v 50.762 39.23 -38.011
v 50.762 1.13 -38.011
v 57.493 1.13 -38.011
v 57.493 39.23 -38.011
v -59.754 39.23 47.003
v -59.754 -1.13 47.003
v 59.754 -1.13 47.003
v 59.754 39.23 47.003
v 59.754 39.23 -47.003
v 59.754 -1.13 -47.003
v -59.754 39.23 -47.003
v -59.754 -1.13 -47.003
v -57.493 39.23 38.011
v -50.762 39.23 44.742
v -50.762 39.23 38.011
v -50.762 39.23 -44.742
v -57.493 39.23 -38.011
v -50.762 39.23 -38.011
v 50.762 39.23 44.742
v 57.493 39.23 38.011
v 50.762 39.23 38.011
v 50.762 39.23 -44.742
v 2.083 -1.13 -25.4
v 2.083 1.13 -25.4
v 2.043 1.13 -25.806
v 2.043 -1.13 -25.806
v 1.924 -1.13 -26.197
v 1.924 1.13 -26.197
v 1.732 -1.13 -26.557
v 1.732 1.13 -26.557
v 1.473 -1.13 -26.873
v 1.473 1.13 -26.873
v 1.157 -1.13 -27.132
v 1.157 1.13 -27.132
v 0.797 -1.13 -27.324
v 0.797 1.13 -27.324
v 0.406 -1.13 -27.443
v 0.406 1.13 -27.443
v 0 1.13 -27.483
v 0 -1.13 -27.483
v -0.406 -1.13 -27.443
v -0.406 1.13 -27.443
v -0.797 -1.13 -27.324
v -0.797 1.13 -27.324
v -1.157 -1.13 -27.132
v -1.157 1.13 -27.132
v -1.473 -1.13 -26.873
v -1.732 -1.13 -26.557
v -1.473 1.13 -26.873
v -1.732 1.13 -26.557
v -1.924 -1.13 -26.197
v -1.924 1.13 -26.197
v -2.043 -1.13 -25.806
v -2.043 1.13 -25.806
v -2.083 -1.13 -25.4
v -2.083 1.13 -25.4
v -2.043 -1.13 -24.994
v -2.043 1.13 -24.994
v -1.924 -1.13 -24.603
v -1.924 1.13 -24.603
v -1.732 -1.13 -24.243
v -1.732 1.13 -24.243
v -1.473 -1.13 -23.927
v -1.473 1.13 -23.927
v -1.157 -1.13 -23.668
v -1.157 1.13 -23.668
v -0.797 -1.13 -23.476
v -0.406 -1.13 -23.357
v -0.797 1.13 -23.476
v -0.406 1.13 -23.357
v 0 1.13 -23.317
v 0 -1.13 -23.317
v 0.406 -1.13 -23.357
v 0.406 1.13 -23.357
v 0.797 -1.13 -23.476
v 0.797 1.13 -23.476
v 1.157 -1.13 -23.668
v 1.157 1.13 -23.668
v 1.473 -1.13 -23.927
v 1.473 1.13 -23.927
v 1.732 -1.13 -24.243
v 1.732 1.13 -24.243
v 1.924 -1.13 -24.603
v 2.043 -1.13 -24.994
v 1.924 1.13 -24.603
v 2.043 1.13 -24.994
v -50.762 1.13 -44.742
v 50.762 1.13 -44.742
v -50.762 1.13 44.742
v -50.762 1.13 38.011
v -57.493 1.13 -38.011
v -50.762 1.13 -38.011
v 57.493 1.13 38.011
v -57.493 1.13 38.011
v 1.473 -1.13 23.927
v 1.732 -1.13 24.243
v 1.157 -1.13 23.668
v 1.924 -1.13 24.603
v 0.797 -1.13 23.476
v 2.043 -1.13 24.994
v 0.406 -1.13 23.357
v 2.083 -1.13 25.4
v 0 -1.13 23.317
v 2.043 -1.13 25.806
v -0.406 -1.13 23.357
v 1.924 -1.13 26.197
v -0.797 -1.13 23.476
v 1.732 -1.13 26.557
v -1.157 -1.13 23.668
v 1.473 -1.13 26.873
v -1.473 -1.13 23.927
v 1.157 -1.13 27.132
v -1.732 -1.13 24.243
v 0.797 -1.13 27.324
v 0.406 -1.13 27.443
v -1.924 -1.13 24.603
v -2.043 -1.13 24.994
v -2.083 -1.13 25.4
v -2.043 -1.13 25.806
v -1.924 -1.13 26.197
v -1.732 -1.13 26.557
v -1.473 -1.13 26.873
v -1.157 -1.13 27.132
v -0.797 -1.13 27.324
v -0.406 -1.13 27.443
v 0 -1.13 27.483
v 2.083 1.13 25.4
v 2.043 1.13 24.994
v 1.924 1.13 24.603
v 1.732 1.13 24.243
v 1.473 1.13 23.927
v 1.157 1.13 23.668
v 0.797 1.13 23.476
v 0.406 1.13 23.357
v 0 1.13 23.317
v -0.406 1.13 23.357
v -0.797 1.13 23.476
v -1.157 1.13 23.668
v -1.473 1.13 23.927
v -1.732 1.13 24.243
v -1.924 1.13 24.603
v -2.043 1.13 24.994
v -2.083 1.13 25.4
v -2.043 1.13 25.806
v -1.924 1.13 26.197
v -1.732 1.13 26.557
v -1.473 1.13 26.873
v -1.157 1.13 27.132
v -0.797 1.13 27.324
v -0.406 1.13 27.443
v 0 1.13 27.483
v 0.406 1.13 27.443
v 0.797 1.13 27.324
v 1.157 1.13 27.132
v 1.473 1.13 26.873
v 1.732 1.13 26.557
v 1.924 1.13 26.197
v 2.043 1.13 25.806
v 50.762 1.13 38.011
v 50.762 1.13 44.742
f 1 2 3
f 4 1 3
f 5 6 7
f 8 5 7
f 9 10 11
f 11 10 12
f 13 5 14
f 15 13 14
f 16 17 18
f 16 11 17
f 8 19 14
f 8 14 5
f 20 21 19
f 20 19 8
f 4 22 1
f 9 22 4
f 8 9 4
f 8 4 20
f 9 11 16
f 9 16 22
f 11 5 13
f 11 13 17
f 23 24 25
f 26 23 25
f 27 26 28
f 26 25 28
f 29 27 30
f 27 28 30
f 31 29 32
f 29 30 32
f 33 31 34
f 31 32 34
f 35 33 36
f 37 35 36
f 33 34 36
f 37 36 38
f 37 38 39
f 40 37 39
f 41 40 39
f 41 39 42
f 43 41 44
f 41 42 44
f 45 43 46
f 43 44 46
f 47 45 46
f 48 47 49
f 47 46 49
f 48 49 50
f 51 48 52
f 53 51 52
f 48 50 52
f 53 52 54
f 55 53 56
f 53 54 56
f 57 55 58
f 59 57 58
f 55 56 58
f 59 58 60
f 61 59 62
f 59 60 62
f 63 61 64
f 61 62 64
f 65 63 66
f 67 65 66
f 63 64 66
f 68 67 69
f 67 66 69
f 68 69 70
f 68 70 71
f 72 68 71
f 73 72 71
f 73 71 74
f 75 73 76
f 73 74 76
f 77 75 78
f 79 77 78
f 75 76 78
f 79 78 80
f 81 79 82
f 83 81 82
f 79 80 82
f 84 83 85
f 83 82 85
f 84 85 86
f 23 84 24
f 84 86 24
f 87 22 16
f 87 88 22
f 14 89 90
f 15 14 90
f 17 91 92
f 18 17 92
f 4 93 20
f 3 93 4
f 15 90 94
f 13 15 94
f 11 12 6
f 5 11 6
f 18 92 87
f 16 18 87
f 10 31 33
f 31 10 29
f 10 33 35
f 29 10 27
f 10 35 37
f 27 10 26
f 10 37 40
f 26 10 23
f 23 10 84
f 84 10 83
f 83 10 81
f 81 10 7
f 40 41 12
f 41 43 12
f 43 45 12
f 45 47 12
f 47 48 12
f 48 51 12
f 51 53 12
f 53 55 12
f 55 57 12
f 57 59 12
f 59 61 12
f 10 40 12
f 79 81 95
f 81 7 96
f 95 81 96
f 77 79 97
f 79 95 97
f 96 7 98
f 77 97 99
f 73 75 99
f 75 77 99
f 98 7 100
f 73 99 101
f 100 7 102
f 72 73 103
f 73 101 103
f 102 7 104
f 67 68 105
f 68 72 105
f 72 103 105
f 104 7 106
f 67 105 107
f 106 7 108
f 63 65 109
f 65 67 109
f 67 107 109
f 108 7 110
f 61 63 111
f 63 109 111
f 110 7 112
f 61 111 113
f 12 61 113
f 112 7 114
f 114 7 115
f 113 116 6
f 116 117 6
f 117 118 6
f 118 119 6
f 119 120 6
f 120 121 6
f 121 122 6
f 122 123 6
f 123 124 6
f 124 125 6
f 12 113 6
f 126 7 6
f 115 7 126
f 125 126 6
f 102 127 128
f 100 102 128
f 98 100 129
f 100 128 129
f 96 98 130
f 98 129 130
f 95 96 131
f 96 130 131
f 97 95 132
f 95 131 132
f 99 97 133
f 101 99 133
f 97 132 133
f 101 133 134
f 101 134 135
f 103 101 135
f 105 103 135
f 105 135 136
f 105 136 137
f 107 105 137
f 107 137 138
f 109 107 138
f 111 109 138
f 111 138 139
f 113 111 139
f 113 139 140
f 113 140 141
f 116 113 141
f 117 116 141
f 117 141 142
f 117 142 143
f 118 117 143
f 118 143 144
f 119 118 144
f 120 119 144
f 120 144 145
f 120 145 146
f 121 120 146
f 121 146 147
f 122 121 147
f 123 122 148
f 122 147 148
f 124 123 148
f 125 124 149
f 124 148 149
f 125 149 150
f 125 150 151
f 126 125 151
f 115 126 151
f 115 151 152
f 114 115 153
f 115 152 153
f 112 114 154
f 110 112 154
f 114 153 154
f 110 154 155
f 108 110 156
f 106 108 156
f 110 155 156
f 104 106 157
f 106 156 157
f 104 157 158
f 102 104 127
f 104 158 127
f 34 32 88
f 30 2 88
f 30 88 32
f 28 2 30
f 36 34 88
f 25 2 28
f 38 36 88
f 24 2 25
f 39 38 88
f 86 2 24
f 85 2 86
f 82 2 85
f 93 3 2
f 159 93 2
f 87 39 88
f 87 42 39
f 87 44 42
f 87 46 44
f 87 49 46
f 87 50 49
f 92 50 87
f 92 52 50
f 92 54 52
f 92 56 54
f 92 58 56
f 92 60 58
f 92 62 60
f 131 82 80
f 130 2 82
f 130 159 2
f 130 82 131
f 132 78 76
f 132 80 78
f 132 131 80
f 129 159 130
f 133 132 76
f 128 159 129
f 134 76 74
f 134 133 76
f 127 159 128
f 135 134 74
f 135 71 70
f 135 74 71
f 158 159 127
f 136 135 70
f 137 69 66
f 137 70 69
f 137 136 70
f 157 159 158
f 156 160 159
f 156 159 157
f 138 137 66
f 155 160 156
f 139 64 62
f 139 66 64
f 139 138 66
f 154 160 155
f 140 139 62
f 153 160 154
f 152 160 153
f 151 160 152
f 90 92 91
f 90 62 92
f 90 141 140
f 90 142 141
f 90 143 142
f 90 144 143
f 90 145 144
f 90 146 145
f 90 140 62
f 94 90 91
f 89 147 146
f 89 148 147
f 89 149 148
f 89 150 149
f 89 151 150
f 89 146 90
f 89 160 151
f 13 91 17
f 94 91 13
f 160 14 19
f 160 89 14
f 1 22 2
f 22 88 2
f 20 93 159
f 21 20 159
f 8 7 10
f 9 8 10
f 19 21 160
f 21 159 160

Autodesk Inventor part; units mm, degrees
ref_plane "YZ Plane" through (0, 0, 0) normal (1, 0, 0) x (0, 1, 0)
ref_plane "XZ Plane" through (0, 0, 0) normal (0, 1, 0) x (-1, 0, 0)
ref_plane "XY Plane" through (0, 0, 0) normal (0, 0, 1) x (1, 0, 0)
sketch "Sketch1" plane through (0, 0, 0) normal (0, 1, 0) x (-1, 0, 0)
  line L0 (-59.7535, -47.0027) -> (59.7535, -47.0027)
  line L1 (59.7535, -47.0027) -> (59.7535, 47.0027)
  line L2 (59.7535, 47.0027) -> (-59.7535, 47.0027)
  line L3 (-59.7535, 47.0027) -> (-59.7535, -47.0027)
  line L4 (-59.7535, -47.0027) -> (59.7535, 47.0027) construction
  line L5 (59.7535, -47.0027) -> (-59.7535, 47.0027) construction
  point P0 (0, 0)
  dimension "d0" = 119.507
  dimension "d1" = 94.0054
extrude "Extrusion1" add sketch "Sketch1" along normal mid plane 2.2606
sketch "Sketch2" plane through (0, 1.1303, 0) normal (0, 1, 0) x (1, 0, 0)
  line L0 (-59.7535, 47.0027) -> (-59.7535, -47.0027) projected
  line L1 (59.7535, -47.0027) -> (59.7535, 47.0027) projected
  line L2 (-59.7535, -47.0027) -> (59.7535, -47.0027)
  line L3 (59.7535, -47.0027) -> (59.7535, 47.0027)
  line L4 (59.7535, 47.0027) -> (-59.7535, 47.0027)
  line L5 (-59.7535, 47.0027) -> (-59.7535, -47.0027)
  line L6 (57.4929, -44.7421) -> (-57.4929, 44.7421) construction
  line L7 (-57.4929, -44.7421) -> (57.4929, 44.7421) construction
  line L8 (-59.7535, -47.0027) -> (59.7535, -47.0027) projected
  line L9 (-59.7535, -47.0027) -> (-50.7619, -47.0027)
  line L10 (-59.7535, -38.0111) -> (-59.7535, -47.0027)
  line L11 (-59.7535, 47.0027) -> (-50.7619, 47.0027)
  line L12 (-59.7535, 38.0111) -> (-59.7535, 47.0027)
  line L13 (59.7535, 47.0027) -> (-59.7535, 47.0027) projected
  line L14 (59.7535, 47.0027) -> (50.7619, 47.0027)
  line L15 (59.7535, 38.0111) -> (59.7535, 47.0027)
  line L16 (59.7535, -47.0027) -> (50.7619, -47.0027)
  line L17 (59.7535, -38.0111) -> (59.7535, -47.0027)
  line L18 (-50.7619, -44.7421) -> (-50.7619, -38.0111)
  line L19 (-50.7619, -38.0111) -> (-57.4929, -38.0111)
  line L20 (-57.4929, 38.0111) -> (-50.7619, 38.0111)
  line L21 (-50.7619, 38.0111) -> (-50.7619, 44.7421)
  line L22 (50.7619, 38.0111) -> (57.4929, 38.0111)
  line L23 (50.7619, 44.7421) -> (50.7619, 38.0111)
  line L24 (57.4929, -38.0111) -> (50.7619, -38.0111)
  line L25 (50.7619, -38.0111) -> (50.7619, -44.7421)
  line L26 (-50.7619, -44.7421) -> (50.7619, -44.7421)
  line L27 (57.4929, -38.0111) -> (57.4929, 38.0111)
  line L28 (50.7619, 44.7421) -> (-50.7619, 44.7421)
  line L29 (-57.4929, 38.0111) -> (-57.4929, -38.0111)
  point P0 (0, 0)
  dimension "d4" = 114.9858
  dimension "d5" = 89.4842
  dimension "d6" = 8.9916
  dimension "d7" = 8.9916
  dimension "d10" = 8.9916
  dimension "d11" = 8.9916
extrude "Extrusion2" add sketch "Sketch2" along normal blind 38.1
sketch "Sketch3" plane through (0, 1.1303, 0) normal (0, 1, 0) x (1, 0, 0)
  circle A0 centre (0, -25.4) radius 2.0828
  circle A1 centre (0, 25.4) radius 2.0828
  point P0 (0, 0)
  dimension "d18" = 4.1656
  dimension "d19" = 4.1656
extrude "Extrusion3" cut sketch "Sketch3" against normal through all
properties part number "546-1590BBS-4.7x3.7-Enclosure"
